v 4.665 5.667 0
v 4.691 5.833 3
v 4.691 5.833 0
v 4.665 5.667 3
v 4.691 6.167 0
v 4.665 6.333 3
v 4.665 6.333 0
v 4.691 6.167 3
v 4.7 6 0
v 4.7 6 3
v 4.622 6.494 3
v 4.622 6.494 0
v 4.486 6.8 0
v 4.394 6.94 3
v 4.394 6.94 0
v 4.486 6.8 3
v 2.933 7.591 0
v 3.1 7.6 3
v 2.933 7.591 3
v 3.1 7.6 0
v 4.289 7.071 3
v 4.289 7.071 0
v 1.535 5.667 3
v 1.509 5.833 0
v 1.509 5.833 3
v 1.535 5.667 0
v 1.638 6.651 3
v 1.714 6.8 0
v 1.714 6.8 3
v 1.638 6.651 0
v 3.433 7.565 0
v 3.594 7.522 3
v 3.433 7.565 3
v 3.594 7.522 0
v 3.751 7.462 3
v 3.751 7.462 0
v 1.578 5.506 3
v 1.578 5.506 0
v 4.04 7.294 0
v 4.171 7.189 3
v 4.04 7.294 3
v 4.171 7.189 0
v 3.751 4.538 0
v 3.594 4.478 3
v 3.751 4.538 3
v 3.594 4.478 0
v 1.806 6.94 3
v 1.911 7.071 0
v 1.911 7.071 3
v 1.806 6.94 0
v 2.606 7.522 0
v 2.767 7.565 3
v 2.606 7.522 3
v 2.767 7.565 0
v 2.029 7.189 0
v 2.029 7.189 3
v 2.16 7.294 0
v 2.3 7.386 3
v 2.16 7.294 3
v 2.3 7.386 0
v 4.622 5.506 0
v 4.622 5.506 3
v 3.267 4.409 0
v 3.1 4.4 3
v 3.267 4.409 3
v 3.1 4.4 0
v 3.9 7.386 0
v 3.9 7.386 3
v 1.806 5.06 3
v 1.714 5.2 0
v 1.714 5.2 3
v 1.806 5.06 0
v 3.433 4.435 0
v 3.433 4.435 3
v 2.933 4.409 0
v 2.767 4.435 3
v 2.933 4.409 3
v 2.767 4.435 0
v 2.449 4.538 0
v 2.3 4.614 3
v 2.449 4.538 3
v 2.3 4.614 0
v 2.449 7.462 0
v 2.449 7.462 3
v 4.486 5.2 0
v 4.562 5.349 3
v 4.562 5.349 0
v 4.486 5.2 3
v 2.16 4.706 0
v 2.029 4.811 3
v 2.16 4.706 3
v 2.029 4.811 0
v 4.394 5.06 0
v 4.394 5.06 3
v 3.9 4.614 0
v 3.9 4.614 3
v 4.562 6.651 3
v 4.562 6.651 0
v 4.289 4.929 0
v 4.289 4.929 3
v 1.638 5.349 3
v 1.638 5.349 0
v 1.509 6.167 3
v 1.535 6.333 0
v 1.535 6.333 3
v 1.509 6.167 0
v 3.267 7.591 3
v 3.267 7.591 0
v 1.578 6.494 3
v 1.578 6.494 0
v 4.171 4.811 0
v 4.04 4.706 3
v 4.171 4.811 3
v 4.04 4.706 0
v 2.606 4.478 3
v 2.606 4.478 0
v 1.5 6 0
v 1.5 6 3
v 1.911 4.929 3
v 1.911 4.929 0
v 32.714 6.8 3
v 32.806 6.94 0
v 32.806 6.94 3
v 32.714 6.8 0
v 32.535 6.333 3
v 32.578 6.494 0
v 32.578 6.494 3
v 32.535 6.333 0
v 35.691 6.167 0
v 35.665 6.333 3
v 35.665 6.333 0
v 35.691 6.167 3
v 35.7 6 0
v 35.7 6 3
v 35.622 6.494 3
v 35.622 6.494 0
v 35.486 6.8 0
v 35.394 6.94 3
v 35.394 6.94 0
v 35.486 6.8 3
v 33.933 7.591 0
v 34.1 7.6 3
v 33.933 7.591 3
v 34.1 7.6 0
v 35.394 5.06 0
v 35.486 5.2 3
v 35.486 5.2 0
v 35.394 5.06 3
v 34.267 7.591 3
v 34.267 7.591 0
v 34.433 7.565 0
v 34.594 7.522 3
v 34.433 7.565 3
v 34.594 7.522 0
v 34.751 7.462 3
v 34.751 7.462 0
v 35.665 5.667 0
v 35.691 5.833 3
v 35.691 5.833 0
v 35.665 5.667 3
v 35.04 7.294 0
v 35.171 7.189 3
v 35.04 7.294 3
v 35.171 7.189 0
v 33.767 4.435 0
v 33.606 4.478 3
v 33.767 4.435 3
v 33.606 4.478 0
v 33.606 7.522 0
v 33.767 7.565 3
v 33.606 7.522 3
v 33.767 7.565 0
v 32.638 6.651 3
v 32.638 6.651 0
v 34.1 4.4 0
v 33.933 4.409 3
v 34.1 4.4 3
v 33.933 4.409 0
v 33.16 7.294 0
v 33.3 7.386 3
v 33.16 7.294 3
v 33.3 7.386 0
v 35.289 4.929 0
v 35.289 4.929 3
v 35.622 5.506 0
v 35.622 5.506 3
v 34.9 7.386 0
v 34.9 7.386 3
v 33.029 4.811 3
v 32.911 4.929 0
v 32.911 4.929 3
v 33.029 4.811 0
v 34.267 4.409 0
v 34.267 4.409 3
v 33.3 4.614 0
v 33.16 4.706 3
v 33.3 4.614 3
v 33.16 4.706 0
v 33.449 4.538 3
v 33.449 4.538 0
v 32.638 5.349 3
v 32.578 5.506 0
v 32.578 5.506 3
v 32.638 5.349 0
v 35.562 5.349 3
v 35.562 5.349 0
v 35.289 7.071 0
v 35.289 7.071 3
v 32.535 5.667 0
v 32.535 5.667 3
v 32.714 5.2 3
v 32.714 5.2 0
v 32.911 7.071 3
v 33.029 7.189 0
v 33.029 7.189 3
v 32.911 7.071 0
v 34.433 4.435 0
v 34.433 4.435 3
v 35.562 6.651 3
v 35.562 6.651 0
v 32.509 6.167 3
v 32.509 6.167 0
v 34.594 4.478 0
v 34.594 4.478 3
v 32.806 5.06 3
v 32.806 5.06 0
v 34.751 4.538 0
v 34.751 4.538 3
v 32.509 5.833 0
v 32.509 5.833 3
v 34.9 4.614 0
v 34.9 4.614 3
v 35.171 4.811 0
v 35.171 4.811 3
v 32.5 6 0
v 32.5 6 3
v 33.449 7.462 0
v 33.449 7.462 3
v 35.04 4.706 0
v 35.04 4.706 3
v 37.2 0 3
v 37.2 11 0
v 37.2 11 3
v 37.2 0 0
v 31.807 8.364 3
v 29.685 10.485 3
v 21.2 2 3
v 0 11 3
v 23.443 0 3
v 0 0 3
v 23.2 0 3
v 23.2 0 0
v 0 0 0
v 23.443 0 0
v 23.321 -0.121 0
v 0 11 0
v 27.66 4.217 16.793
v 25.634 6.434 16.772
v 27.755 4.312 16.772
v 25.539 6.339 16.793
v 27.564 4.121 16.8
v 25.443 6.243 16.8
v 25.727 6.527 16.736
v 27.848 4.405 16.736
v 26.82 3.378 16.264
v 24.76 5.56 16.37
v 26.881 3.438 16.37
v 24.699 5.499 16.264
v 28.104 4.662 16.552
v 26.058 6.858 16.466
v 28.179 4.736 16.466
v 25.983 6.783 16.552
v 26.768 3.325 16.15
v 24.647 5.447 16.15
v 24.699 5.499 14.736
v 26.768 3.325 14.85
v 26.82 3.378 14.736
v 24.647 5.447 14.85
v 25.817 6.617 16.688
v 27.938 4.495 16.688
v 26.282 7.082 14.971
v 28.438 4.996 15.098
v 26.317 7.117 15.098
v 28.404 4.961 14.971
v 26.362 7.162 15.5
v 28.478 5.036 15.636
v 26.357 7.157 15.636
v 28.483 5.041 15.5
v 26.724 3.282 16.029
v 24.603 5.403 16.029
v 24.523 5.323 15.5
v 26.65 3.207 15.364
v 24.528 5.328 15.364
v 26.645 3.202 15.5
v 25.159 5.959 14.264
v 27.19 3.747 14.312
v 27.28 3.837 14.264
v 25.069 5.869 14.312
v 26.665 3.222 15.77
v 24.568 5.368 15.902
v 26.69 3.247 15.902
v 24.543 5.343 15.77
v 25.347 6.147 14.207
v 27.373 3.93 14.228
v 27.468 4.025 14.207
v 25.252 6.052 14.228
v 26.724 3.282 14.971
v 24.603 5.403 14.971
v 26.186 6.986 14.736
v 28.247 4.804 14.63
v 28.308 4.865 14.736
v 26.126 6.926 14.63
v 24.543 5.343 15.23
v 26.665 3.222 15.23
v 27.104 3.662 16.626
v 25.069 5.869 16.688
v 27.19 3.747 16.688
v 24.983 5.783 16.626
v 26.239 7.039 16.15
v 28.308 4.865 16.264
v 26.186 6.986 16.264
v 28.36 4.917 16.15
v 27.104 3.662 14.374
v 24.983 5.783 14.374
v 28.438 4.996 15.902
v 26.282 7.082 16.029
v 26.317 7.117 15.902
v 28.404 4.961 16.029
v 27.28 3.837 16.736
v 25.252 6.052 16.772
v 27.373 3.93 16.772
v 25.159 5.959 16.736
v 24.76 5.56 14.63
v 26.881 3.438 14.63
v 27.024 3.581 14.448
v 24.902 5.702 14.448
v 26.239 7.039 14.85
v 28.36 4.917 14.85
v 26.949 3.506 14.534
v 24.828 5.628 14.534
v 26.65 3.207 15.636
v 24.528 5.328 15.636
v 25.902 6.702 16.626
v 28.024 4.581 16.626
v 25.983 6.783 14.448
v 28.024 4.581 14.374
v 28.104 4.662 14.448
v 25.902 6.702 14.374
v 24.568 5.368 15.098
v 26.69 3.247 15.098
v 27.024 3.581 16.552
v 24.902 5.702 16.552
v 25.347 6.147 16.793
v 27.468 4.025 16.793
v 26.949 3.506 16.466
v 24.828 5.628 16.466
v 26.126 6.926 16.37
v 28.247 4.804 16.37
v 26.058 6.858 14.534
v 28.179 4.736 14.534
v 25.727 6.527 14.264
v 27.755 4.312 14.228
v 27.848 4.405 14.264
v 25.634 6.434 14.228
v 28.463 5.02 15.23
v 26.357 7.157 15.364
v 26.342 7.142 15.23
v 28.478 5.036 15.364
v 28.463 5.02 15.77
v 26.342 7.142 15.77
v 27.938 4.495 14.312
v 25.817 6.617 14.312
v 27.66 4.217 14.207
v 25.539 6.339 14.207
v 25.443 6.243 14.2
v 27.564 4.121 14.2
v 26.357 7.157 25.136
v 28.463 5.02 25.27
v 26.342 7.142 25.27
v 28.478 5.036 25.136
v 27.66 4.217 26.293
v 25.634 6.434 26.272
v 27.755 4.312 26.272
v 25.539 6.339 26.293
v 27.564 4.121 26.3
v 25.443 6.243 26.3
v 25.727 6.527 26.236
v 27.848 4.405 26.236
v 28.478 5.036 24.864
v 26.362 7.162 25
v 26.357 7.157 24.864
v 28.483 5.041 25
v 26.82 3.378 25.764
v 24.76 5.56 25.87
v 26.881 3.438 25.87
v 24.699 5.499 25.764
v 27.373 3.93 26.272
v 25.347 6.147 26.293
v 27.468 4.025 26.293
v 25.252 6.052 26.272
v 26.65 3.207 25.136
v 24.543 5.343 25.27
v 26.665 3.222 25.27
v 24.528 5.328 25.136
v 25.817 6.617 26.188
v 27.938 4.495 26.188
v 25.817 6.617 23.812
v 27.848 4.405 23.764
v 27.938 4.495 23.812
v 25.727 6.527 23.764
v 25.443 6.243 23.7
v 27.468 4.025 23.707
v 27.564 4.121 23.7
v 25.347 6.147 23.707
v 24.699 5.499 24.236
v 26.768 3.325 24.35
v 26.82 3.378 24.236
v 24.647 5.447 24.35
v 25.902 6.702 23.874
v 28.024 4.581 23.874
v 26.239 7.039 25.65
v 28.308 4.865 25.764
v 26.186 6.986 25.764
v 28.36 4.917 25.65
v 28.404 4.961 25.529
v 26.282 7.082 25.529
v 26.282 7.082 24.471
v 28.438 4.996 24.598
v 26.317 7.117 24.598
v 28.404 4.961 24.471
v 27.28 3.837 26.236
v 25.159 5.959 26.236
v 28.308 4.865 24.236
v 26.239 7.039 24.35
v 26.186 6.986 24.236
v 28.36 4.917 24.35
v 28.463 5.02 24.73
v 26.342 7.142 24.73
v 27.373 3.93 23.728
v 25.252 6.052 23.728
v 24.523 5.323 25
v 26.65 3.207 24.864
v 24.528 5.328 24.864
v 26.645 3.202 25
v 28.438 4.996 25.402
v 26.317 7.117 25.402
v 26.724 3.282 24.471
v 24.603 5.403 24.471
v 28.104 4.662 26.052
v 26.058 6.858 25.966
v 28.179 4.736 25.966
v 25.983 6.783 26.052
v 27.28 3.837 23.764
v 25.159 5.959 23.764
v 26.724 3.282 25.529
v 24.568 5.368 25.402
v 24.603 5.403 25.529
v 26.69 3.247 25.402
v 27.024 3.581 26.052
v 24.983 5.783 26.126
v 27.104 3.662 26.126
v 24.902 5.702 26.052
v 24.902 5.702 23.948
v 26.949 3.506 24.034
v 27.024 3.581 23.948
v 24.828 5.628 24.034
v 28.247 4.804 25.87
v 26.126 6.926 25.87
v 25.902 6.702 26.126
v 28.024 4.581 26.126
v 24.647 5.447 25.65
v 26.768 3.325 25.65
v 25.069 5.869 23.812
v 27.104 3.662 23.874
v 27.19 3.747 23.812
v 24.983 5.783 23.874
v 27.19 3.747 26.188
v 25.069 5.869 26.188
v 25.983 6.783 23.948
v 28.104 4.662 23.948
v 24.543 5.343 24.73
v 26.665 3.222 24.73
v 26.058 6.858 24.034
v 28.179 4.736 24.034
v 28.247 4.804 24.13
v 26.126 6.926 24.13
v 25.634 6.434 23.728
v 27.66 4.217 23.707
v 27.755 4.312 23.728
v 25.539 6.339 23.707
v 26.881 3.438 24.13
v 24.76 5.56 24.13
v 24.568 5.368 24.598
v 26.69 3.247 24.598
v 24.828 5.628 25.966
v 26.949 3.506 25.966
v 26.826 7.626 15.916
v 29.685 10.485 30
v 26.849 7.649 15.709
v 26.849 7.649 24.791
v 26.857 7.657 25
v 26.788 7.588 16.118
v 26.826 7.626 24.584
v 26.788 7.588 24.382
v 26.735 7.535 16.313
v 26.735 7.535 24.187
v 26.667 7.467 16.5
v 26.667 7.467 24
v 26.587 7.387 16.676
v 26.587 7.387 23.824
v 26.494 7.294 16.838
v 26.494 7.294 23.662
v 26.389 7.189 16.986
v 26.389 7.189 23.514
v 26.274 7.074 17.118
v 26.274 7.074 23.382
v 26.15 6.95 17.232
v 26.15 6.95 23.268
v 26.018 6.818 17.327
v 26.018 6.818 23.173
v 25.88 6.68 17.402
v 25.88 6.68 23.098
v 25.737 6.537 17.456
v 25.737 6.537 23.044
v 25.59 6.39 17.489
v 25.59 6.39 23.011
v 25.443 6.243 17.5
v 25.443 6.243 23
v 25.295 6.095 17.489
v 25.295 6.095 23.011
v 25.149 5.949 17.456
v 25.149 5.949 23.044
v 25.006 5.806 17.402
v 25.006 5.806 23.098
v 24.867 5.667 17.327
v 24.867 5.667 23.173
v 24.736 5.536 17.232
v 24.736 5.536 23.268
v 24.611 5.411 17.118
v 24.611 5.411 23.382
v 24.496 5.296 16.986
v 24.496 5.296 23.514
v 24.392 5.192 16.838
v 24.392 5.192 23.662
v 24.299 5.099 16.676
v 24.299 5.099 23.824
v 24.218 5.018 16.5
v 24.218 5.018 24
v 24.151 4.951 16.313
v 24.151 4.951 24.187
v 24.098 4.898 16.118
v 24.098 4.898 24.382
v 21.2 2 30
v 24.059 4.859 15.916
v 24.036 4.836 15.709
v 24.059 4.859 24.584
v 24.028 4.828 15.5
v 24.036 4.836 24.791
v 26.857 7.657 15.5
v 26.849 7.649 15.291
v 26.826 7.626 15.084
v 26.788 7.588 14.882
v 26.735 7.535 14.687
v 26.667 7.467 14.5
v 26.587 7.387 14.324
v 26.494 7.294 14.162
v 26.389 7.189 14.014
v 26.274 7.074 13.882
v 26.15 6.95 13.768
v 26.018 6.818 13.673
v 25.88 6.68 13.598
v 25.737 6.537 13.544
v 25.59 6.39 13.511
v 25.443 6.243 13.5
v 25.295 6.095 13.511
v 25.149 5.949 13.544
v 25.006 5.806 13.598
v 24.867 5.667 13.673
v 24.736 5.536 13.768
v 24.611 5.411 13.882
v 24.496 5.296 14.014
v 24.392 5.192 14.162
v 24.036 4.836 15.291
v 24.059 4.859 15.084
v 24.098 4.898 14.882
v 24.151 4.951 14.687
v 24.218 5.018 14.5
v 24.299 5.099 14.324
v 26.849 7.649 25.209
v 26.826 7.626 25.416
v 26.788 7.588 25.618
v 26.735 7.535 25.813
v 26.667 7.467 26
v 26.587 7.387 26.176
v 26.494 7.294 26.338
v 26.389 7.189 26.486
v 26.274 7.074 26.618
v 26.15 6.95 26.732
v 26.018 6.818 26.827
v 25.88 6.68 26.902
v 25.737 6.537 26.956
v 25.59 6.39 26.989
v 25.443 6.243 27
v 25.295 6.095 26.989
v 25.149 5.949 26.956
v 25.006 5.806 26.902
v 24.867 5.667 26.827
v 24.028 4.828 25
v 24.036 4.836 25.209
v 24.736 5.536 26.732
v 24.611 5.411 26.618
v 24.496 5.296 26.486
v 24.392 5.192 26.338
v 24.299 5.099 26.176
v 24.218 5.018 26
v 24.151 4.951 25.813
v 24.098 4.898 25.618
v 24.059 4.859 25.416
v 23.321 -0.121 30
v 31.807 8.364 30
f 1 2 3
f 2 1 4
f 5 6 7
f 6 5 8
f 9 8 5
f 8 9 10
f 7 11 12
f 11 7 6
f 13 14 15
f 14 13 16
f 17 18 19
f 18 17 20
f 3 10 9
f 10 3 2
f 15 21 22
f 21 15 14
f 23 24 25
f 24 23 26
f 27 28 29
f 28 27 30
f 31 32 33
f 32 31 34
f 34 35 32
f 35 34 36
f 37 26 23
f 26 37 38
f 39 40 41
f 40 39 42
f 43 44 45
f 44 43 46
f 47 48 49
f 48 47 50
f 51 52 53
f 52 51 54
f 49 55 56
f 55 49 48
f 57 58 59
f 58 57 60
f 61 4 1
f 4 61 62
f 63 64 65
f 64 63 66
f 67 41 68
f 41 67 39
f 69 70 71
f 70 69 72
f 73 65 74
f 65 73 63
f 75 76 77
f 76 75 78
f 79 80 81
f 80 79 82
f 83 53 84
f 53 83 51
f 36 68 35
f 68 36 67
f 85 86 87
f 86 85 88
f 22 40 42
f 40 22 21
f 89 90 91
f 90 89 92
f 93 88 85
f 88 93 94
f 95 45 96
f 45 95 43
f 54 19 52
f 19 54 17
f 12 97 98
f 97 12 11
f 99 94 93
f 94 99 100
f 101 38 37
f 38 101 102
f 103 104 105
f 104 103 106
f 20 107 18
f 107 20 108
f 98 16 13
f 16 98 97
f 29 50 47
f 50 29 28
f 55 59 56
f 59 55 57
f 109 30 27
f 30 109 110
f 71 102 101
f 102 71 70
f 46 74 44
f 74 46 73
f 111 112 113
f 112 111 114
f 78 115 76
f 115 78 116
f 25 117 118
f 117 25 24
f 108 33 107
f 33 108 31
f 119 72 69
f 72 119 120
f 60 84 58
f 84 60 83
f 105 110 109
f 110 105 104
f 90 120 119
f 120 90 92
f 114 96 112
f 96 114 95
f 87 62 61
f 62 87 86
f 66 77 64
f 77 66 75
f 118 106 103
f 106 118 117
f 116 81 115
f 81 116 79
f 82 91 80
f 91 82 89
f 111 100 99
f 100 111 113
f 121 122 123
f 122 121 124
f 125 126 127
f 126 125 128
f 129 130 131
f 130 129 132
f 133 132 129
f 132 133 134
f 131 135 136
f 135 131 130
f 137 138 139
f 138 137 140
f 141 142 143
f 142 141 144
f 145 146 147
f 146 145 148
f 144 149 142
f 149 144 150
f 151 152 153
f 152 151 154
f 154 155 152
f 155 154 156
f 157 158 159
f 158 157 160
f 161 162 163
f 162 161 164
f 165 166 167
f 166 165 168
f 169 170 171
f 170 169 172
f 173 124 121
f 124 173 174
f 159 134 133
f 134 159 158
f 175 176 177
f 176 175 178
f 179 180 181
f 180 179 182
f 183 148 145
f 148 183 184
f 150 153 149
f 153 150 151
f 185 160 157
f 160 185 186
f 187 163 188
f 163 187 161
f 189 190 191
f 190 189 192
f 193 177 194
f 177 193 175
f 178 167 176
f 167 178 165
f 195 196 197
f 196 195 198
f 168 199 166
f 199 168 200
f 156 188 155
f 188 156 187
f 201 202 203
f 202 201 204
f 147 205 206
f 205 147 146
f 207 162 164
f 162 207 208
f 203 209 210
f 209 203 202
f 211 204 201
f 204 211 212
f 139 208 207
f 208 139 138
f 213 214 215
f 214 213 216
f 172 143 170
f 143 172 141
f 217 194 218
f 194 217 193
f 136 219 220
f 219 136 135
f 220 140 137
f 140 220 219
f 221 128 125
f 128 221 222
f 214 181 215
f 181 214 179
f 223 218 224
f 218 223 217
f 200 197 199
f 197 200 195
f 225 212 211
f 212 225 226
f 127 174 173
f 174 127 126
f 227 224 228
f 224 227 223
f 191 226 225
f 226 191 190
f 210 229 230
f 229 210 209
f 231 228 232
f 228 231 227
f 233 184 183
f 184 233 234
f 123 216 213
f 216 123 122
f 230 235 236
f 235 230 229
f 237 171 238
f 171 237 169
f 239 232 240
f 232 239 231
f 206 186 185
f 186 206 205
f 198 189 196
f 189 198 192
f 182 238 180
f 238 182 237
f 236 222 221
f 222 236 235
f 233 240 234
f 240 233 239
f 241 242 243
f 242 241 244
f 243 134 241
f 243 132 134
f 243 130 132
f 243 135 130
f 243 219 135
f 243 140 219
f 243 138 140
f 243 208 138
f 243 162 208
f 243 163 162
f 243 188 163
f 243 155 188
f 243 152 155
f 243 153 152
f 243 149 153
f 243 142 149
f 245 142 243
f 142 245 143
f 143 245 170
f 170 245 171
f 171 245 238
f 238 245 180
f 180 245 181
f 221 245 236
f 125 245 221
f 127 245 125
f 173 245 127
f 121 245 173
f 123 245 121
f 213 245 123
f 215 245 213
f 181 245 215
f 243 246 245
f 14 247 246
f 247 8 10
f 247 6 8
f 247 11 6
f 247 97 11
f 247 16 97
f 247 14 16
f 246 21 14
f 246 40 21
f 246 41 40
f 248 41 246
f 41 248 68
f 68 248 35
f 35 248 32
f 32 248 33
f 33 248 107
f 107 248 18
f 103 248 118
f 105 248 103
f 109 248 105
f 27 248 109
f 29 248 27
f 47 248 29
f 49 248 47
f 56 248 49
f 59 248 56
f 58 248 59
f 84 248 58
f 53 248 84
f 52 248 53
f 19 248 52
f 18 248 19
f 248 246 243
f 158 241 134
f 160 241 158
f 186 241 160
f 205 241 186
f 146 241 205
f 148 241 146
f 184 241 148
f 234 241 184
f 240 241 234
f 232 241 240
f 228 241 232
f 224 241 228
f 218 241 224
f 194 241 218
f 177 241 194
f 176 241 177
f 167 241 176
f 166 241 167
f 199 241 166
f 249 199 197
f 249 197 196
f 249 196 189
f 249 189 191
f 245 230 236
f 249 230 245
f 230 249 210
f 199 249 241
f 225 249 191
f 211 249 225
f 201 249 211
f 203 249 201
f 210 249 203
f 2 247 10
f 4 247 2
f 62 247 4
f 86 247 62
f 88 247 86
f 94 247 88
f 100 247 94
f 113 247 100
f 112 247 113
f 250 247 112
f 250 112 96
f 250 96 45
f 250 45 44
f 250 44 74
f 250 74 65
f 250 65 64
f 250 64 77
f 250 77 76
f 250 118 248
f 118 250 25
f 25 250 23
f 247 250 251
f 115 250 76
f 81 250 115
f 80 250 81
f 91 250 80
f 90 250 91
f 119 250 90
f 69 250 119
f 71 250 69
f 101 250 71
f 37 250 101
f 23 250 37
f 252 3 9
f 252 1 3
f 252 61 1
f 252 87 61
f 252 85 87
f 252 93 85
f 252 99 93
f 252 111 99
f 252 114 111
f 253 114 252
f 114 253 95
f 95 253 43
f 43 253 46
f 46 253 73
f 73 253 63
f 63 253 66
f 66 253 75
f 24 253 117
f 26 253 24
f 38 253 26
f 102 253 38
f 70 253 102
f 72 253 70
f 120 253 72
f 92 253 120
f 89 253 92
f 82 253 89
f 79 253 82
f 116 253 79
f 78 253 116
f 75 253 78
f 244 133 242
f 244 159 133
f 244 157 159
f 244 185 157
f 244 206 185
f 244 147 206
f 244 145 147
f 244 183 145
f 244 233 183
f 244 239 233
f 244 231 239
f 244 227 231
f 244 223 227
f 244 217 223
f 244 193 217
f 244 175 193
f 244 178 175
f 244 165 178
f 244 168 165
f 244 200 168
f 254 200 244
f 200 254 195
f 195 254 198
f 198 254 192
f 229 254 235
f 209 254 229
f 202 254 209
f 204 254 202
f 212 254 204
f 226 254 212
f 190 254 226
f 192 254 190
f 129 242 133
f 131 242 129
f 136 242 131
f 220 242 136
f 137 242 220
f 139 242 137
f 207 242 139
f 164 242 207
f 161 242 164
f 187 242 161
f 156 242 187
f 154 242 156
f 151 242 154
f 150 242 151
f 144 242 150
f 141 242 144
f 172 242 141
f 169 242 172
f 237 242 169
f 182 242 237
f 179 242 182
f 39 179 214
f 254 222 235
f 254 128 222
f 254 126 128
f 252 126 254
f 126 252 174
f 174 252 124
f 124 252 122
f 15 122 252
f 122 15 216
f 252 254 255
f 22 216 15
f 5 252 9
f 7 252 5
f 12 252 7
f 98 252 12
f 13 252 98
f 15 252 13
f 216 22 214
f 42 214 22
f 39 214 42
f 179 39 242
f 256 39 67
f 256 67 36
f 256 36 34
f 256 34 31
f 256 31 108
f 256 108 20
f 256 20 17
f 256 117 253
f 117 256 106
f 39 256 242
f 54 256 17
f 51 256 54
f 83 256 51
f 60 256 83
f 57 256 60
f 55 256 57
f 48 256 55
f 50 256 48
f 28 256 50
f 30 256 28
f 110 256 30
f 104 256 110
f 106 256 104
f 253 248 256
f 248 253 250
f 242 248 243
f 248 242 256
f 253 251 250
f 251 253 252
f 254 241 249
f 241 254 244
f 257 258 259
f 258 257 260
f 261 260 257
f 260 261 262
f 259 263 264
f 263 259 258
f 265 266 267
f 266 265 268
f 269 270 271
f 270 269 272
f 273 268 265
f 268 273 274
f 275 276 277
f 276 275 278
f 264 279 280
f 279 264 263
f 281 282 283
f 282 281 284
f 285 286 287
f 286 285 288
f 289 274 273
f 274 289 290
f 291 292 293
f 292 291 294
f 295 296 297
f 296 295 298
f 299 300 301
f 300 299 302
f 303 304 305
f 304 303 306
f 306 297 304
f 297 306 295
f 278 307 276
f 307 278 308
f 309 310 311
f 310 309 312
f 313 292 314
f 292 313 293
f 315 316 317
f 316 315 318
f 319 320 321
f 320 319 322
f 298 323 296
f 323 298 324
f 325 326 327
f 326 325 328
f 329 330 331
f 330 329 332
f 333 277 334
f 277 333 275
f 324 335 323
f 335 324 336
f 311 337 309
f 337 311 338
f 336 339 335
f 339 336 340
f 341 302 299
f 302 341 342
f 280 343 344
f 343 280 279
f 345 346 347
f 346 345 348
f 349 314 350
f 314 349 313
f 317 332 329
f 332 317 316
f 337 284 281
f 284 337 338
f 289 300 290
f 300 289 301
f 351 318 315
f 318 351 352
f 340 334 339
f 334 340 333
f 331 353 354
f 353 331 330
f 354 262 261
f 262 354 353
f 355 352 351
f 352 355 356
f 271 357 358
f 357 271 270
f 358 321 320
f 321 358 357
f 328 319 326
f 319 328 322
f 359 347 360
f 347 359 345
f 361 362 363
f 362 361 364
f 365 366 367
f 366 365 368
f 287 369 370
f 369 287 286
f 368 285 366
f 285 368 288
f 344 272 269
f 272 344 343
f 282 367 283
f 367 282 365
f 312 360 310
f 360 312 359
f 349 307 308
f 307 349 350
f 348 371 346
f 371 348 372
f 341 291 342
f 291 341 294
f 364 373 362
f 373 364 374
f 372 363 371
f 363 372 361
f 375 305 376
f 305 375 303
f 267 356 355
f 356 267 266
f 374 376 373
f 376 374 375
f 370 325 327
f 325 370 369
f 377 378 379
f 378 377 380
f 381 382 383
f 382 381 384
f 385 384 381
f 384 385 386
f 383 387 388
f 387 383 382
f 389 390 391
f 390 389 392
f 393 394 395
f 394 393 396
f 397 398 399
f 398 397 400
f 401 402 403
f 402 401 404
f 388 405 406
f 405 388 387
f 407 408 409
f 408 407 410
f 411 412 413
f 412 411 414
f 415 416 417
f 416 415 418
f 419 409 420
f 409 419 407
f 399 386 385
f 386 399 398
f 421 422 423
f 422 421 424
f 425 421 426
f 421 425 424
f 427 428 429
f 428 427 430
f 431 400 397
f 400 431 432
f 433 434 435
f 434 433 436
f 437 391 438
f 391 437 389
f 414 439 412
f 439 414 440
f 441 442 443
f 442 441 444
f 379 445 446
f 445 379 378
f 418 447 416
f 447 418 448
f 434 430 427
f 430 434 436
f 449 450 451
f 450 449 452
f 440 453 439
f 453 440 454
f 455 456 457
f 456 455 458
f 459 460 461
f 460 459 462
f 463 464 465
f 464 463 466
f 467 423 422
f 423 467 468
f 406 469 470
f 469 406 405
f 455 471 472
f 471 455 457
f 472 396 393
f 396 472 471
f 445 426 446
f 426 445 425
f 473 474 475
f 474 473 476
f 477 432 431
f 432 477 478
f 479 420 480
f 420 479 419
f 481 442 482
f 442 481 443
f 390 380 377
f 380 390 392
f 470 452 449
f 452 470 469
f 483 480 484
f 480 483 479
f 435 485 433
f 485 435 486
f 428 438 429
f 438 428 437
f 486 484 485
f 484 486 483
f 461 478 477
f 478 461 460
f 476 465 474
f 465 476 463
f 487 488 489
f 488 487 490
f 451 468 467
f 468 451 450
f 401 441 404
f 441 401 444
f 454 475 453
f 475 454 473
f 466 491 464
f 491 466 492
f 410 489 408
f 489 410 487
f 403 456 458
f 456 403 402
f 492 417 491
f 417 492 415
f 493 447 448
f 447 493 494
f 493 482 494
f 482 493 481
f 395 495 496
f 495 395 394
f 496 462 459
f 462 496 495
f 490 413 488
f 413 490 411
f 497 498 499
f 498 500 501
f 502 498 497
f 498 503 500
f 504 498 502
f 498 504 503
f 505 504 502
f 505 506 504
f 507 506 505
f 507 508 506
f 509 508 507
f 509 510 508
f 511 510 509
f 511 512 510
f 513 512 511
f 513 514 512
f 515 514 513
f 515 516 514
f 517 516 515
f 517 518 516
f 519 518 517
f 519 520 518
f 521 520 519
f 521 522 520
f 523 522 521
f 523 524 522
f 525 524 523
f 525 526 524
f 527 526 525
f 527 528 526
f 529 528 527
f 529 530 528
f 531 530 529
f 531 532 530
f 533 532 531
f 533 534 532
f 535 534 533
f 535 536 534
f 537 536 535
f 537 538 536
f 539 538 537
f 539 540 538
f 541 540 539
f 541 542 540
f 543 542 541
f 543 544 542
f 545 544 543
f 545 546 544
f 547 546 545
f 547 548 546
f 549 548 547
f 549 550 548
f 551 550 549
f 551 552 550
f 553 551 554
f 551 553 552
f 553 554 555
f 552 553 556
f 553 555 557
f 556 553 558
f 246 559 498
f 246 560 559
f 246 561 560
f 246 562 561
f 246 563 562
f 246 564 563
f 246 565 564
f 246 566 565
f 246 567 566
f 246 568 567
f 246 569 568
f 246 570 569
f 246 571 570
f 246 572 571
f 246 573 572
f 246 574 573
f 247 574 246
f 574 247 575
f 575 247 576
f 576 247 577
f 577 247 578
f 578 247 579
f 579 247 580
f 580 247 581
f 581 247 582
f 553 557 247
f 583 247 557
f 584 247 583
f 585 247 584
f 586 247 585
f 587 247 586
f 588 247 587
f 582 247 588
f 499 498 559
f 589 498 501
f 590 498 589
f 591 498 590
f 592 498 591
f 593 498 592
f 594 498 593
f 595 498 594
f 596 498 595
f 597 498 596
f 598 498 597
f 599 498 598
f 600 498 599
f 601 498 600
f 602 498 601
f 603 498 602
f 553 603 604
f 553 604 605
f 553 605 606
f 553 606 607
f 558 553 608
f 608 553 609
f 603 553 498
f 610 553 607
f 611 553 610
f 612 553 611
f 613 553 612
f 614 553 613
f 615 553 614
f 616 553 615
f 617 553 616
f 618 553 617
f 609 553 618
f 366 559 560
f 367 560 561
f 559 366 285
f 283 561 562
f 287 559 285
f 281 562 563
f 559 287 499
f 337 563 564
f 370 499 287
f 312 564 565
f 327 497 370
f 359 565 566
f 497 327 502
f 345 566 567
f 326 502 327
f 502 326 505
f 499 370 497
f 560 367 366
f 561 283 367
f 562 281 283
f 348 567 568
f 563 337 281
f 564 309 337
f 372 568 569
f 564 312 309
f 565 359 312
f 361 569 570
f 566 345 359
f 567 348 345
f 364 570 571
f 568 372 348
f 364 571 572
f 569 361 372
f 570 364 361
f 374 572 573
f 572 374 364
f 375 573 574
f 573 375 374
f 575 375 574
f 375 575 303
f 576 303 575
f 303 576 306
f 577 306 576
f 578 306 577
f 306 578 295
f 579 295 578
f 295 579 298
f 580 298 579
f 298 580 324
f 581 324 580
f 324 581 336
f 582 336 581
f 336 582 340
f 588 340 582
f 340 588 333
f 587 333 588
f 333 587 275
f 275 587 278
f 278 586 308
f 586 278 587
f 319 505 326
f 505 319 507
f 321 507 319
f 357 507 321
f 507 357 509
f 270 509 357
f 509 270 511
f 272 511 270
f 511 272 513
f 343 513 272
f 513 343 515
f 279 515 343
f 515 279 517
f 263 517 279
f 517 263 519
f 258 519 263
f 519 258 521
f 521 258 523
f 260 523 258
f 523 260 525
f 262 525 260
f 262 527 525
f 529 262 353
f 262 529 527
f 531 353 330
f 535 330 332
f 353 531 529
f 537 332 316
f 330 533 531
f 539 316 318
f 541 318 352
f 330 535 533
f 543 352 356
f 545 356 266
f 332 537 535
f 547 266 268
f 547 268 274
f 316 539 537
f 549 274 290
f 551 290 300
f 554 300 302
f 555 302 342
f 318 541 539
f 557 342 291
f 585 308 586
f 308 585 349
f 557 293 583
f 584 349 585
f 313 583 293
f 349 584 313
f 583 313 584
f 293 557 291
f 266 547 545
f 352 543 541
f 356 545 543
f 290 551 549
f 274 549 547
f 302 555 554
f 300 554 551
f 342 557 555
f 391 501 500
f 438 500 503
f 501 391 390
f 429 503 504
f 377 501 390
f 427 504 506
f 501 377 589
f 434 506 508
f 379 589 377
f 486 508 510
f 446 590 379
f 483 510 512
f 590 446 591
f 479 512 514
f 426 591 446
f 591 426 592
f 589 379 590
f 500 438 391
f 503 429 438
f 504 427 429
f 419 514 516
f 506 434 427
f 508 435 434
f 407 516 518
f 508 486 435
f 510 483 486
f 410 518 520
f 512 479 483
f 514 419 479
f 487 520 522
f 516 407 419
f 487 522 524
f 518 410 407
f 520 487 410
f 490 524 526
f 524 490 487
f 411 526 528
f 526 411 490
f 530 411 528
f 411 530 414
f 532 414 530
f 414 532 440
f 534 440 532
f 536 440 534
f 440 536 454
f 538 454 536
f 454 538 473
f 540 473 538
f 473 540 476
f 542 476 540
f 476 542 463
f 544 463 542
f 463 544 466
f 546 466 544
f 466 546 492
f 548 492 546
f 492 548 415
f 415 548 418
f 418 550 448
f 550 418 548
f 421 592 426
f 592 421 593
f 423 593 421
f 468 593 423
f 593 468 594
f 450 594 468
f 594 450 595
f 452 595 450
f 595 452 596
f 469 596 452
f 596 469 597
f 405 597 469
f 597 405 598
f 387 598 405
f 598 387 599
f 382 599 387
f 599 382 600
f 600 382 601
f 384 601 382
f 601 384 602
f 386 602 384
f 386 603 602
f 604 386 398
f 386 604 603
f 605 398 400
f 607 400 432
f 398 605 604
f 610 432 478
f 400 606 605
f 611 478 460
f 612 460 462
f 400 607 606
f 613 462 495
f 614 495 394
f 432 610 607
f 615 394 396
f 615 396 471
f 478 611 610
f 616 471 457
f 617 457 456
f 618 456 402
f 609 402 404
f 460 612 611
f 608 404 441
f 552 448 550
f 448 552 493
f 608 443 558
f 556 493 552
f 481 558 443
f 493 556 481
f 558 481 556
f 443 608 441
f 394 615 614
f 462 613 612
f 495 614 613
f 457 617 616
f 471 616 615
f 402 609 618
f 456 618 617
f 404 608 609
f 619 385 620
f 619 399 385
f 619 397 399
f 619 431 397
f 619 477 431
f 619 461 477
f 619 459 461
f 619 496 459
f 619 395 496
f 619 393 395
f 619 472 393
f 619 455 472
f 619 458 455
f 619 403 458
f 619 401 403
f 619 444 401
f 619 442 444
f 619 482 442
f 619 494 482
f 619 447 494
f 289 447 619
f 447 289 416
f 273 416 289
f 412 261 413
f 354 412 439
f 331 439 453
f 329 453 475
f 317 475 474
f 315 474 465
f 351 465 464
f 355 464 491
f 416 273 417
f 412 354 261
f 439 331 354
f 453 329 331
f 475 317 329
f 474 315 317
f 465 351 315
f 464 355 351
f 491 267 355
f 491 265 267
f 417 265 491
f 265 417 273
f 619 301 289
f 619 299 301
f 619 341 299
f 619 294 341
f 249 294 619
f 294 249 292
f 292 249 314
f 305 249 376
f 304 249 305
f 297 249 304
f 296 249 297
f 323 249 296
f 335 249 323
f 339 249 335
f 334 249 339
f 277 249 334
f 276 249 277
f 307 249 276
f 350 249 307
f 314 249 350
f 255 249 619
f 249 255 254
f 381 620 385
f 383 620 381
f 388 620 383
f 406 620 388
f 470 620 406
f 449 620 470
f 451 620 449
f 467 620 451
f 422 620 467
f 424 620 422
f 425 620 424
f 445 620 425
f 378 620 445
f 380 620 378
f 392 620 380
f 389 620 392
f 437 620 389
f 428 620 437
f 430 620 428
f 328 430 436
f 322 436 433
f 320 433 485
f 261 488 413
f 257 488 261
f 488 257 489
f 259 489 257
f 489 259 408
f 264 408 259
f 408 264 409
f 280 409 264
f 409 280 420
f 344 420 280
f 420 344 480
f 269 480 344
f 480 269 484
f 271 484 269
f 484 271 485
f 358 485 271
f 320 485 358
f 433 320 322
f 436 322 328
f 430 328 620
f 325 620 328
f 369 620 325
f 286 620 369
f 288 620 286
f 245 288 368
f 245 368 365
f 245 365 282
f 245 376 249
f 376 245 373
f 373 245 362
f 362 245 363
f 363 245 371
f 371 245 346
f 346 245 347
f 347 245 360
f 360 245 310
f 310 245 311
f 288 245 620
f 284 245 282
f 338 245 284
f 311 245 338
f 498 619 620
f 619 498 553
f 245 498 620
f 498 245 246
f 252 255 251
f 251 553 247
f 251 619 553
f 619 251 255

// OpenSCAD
$fn=60;

base_screw_spacing = 31;
base_screw_diam = 3.2;
base_h = 3;
base_w = 11;
base_l = base_screw_spacing + base_screw_diam + 3;

riser_w = 3;
riser_h = 30;
riser_l = 12; // base width * square(2)

module base(){
    difference(){
    
        cube([base_l, base_w, base_h ]);
        base_holes();
    }
}

module base_holes(){
    translate([1.5 + base_screw_diam / 2, base_w - 5, -0.01]){
        cylinder(d = base_screw_diam, h=base_h + 1);
        translate([base_screw_spacing, 0, 0])
        cylinder(d = base_screw_diam, h=base_h + 1);
    }
}

module riser(){
    translate([base_l - 16, 2, 0])
    rotate([0, 0, -45]){
    
        difference(){       
            cube([riser_w, riser_l, riser_h]);

            translate([0, riser_l / 2 , riser_h - 5 - 9.5])
            rotate([0, -90, 0])
            holes();
        }
    }
}

module holes(){
    
    // align top of holes to the begining of screw head
    
    translate([0, 0, -5]){
        // Main holes
        cylinder(d=2.6, h=10);
        translate([9.5, 0, 0])
        cylinder(d=2.6, h=10);
        
        // Screw heads holes
        translate([0, 0, 5])
        cylinder(d=4, h=5);
        
        translate([9.5, 0, 5])
        cylinder(d=4, h=5);
    }    
}

base();
riser();
